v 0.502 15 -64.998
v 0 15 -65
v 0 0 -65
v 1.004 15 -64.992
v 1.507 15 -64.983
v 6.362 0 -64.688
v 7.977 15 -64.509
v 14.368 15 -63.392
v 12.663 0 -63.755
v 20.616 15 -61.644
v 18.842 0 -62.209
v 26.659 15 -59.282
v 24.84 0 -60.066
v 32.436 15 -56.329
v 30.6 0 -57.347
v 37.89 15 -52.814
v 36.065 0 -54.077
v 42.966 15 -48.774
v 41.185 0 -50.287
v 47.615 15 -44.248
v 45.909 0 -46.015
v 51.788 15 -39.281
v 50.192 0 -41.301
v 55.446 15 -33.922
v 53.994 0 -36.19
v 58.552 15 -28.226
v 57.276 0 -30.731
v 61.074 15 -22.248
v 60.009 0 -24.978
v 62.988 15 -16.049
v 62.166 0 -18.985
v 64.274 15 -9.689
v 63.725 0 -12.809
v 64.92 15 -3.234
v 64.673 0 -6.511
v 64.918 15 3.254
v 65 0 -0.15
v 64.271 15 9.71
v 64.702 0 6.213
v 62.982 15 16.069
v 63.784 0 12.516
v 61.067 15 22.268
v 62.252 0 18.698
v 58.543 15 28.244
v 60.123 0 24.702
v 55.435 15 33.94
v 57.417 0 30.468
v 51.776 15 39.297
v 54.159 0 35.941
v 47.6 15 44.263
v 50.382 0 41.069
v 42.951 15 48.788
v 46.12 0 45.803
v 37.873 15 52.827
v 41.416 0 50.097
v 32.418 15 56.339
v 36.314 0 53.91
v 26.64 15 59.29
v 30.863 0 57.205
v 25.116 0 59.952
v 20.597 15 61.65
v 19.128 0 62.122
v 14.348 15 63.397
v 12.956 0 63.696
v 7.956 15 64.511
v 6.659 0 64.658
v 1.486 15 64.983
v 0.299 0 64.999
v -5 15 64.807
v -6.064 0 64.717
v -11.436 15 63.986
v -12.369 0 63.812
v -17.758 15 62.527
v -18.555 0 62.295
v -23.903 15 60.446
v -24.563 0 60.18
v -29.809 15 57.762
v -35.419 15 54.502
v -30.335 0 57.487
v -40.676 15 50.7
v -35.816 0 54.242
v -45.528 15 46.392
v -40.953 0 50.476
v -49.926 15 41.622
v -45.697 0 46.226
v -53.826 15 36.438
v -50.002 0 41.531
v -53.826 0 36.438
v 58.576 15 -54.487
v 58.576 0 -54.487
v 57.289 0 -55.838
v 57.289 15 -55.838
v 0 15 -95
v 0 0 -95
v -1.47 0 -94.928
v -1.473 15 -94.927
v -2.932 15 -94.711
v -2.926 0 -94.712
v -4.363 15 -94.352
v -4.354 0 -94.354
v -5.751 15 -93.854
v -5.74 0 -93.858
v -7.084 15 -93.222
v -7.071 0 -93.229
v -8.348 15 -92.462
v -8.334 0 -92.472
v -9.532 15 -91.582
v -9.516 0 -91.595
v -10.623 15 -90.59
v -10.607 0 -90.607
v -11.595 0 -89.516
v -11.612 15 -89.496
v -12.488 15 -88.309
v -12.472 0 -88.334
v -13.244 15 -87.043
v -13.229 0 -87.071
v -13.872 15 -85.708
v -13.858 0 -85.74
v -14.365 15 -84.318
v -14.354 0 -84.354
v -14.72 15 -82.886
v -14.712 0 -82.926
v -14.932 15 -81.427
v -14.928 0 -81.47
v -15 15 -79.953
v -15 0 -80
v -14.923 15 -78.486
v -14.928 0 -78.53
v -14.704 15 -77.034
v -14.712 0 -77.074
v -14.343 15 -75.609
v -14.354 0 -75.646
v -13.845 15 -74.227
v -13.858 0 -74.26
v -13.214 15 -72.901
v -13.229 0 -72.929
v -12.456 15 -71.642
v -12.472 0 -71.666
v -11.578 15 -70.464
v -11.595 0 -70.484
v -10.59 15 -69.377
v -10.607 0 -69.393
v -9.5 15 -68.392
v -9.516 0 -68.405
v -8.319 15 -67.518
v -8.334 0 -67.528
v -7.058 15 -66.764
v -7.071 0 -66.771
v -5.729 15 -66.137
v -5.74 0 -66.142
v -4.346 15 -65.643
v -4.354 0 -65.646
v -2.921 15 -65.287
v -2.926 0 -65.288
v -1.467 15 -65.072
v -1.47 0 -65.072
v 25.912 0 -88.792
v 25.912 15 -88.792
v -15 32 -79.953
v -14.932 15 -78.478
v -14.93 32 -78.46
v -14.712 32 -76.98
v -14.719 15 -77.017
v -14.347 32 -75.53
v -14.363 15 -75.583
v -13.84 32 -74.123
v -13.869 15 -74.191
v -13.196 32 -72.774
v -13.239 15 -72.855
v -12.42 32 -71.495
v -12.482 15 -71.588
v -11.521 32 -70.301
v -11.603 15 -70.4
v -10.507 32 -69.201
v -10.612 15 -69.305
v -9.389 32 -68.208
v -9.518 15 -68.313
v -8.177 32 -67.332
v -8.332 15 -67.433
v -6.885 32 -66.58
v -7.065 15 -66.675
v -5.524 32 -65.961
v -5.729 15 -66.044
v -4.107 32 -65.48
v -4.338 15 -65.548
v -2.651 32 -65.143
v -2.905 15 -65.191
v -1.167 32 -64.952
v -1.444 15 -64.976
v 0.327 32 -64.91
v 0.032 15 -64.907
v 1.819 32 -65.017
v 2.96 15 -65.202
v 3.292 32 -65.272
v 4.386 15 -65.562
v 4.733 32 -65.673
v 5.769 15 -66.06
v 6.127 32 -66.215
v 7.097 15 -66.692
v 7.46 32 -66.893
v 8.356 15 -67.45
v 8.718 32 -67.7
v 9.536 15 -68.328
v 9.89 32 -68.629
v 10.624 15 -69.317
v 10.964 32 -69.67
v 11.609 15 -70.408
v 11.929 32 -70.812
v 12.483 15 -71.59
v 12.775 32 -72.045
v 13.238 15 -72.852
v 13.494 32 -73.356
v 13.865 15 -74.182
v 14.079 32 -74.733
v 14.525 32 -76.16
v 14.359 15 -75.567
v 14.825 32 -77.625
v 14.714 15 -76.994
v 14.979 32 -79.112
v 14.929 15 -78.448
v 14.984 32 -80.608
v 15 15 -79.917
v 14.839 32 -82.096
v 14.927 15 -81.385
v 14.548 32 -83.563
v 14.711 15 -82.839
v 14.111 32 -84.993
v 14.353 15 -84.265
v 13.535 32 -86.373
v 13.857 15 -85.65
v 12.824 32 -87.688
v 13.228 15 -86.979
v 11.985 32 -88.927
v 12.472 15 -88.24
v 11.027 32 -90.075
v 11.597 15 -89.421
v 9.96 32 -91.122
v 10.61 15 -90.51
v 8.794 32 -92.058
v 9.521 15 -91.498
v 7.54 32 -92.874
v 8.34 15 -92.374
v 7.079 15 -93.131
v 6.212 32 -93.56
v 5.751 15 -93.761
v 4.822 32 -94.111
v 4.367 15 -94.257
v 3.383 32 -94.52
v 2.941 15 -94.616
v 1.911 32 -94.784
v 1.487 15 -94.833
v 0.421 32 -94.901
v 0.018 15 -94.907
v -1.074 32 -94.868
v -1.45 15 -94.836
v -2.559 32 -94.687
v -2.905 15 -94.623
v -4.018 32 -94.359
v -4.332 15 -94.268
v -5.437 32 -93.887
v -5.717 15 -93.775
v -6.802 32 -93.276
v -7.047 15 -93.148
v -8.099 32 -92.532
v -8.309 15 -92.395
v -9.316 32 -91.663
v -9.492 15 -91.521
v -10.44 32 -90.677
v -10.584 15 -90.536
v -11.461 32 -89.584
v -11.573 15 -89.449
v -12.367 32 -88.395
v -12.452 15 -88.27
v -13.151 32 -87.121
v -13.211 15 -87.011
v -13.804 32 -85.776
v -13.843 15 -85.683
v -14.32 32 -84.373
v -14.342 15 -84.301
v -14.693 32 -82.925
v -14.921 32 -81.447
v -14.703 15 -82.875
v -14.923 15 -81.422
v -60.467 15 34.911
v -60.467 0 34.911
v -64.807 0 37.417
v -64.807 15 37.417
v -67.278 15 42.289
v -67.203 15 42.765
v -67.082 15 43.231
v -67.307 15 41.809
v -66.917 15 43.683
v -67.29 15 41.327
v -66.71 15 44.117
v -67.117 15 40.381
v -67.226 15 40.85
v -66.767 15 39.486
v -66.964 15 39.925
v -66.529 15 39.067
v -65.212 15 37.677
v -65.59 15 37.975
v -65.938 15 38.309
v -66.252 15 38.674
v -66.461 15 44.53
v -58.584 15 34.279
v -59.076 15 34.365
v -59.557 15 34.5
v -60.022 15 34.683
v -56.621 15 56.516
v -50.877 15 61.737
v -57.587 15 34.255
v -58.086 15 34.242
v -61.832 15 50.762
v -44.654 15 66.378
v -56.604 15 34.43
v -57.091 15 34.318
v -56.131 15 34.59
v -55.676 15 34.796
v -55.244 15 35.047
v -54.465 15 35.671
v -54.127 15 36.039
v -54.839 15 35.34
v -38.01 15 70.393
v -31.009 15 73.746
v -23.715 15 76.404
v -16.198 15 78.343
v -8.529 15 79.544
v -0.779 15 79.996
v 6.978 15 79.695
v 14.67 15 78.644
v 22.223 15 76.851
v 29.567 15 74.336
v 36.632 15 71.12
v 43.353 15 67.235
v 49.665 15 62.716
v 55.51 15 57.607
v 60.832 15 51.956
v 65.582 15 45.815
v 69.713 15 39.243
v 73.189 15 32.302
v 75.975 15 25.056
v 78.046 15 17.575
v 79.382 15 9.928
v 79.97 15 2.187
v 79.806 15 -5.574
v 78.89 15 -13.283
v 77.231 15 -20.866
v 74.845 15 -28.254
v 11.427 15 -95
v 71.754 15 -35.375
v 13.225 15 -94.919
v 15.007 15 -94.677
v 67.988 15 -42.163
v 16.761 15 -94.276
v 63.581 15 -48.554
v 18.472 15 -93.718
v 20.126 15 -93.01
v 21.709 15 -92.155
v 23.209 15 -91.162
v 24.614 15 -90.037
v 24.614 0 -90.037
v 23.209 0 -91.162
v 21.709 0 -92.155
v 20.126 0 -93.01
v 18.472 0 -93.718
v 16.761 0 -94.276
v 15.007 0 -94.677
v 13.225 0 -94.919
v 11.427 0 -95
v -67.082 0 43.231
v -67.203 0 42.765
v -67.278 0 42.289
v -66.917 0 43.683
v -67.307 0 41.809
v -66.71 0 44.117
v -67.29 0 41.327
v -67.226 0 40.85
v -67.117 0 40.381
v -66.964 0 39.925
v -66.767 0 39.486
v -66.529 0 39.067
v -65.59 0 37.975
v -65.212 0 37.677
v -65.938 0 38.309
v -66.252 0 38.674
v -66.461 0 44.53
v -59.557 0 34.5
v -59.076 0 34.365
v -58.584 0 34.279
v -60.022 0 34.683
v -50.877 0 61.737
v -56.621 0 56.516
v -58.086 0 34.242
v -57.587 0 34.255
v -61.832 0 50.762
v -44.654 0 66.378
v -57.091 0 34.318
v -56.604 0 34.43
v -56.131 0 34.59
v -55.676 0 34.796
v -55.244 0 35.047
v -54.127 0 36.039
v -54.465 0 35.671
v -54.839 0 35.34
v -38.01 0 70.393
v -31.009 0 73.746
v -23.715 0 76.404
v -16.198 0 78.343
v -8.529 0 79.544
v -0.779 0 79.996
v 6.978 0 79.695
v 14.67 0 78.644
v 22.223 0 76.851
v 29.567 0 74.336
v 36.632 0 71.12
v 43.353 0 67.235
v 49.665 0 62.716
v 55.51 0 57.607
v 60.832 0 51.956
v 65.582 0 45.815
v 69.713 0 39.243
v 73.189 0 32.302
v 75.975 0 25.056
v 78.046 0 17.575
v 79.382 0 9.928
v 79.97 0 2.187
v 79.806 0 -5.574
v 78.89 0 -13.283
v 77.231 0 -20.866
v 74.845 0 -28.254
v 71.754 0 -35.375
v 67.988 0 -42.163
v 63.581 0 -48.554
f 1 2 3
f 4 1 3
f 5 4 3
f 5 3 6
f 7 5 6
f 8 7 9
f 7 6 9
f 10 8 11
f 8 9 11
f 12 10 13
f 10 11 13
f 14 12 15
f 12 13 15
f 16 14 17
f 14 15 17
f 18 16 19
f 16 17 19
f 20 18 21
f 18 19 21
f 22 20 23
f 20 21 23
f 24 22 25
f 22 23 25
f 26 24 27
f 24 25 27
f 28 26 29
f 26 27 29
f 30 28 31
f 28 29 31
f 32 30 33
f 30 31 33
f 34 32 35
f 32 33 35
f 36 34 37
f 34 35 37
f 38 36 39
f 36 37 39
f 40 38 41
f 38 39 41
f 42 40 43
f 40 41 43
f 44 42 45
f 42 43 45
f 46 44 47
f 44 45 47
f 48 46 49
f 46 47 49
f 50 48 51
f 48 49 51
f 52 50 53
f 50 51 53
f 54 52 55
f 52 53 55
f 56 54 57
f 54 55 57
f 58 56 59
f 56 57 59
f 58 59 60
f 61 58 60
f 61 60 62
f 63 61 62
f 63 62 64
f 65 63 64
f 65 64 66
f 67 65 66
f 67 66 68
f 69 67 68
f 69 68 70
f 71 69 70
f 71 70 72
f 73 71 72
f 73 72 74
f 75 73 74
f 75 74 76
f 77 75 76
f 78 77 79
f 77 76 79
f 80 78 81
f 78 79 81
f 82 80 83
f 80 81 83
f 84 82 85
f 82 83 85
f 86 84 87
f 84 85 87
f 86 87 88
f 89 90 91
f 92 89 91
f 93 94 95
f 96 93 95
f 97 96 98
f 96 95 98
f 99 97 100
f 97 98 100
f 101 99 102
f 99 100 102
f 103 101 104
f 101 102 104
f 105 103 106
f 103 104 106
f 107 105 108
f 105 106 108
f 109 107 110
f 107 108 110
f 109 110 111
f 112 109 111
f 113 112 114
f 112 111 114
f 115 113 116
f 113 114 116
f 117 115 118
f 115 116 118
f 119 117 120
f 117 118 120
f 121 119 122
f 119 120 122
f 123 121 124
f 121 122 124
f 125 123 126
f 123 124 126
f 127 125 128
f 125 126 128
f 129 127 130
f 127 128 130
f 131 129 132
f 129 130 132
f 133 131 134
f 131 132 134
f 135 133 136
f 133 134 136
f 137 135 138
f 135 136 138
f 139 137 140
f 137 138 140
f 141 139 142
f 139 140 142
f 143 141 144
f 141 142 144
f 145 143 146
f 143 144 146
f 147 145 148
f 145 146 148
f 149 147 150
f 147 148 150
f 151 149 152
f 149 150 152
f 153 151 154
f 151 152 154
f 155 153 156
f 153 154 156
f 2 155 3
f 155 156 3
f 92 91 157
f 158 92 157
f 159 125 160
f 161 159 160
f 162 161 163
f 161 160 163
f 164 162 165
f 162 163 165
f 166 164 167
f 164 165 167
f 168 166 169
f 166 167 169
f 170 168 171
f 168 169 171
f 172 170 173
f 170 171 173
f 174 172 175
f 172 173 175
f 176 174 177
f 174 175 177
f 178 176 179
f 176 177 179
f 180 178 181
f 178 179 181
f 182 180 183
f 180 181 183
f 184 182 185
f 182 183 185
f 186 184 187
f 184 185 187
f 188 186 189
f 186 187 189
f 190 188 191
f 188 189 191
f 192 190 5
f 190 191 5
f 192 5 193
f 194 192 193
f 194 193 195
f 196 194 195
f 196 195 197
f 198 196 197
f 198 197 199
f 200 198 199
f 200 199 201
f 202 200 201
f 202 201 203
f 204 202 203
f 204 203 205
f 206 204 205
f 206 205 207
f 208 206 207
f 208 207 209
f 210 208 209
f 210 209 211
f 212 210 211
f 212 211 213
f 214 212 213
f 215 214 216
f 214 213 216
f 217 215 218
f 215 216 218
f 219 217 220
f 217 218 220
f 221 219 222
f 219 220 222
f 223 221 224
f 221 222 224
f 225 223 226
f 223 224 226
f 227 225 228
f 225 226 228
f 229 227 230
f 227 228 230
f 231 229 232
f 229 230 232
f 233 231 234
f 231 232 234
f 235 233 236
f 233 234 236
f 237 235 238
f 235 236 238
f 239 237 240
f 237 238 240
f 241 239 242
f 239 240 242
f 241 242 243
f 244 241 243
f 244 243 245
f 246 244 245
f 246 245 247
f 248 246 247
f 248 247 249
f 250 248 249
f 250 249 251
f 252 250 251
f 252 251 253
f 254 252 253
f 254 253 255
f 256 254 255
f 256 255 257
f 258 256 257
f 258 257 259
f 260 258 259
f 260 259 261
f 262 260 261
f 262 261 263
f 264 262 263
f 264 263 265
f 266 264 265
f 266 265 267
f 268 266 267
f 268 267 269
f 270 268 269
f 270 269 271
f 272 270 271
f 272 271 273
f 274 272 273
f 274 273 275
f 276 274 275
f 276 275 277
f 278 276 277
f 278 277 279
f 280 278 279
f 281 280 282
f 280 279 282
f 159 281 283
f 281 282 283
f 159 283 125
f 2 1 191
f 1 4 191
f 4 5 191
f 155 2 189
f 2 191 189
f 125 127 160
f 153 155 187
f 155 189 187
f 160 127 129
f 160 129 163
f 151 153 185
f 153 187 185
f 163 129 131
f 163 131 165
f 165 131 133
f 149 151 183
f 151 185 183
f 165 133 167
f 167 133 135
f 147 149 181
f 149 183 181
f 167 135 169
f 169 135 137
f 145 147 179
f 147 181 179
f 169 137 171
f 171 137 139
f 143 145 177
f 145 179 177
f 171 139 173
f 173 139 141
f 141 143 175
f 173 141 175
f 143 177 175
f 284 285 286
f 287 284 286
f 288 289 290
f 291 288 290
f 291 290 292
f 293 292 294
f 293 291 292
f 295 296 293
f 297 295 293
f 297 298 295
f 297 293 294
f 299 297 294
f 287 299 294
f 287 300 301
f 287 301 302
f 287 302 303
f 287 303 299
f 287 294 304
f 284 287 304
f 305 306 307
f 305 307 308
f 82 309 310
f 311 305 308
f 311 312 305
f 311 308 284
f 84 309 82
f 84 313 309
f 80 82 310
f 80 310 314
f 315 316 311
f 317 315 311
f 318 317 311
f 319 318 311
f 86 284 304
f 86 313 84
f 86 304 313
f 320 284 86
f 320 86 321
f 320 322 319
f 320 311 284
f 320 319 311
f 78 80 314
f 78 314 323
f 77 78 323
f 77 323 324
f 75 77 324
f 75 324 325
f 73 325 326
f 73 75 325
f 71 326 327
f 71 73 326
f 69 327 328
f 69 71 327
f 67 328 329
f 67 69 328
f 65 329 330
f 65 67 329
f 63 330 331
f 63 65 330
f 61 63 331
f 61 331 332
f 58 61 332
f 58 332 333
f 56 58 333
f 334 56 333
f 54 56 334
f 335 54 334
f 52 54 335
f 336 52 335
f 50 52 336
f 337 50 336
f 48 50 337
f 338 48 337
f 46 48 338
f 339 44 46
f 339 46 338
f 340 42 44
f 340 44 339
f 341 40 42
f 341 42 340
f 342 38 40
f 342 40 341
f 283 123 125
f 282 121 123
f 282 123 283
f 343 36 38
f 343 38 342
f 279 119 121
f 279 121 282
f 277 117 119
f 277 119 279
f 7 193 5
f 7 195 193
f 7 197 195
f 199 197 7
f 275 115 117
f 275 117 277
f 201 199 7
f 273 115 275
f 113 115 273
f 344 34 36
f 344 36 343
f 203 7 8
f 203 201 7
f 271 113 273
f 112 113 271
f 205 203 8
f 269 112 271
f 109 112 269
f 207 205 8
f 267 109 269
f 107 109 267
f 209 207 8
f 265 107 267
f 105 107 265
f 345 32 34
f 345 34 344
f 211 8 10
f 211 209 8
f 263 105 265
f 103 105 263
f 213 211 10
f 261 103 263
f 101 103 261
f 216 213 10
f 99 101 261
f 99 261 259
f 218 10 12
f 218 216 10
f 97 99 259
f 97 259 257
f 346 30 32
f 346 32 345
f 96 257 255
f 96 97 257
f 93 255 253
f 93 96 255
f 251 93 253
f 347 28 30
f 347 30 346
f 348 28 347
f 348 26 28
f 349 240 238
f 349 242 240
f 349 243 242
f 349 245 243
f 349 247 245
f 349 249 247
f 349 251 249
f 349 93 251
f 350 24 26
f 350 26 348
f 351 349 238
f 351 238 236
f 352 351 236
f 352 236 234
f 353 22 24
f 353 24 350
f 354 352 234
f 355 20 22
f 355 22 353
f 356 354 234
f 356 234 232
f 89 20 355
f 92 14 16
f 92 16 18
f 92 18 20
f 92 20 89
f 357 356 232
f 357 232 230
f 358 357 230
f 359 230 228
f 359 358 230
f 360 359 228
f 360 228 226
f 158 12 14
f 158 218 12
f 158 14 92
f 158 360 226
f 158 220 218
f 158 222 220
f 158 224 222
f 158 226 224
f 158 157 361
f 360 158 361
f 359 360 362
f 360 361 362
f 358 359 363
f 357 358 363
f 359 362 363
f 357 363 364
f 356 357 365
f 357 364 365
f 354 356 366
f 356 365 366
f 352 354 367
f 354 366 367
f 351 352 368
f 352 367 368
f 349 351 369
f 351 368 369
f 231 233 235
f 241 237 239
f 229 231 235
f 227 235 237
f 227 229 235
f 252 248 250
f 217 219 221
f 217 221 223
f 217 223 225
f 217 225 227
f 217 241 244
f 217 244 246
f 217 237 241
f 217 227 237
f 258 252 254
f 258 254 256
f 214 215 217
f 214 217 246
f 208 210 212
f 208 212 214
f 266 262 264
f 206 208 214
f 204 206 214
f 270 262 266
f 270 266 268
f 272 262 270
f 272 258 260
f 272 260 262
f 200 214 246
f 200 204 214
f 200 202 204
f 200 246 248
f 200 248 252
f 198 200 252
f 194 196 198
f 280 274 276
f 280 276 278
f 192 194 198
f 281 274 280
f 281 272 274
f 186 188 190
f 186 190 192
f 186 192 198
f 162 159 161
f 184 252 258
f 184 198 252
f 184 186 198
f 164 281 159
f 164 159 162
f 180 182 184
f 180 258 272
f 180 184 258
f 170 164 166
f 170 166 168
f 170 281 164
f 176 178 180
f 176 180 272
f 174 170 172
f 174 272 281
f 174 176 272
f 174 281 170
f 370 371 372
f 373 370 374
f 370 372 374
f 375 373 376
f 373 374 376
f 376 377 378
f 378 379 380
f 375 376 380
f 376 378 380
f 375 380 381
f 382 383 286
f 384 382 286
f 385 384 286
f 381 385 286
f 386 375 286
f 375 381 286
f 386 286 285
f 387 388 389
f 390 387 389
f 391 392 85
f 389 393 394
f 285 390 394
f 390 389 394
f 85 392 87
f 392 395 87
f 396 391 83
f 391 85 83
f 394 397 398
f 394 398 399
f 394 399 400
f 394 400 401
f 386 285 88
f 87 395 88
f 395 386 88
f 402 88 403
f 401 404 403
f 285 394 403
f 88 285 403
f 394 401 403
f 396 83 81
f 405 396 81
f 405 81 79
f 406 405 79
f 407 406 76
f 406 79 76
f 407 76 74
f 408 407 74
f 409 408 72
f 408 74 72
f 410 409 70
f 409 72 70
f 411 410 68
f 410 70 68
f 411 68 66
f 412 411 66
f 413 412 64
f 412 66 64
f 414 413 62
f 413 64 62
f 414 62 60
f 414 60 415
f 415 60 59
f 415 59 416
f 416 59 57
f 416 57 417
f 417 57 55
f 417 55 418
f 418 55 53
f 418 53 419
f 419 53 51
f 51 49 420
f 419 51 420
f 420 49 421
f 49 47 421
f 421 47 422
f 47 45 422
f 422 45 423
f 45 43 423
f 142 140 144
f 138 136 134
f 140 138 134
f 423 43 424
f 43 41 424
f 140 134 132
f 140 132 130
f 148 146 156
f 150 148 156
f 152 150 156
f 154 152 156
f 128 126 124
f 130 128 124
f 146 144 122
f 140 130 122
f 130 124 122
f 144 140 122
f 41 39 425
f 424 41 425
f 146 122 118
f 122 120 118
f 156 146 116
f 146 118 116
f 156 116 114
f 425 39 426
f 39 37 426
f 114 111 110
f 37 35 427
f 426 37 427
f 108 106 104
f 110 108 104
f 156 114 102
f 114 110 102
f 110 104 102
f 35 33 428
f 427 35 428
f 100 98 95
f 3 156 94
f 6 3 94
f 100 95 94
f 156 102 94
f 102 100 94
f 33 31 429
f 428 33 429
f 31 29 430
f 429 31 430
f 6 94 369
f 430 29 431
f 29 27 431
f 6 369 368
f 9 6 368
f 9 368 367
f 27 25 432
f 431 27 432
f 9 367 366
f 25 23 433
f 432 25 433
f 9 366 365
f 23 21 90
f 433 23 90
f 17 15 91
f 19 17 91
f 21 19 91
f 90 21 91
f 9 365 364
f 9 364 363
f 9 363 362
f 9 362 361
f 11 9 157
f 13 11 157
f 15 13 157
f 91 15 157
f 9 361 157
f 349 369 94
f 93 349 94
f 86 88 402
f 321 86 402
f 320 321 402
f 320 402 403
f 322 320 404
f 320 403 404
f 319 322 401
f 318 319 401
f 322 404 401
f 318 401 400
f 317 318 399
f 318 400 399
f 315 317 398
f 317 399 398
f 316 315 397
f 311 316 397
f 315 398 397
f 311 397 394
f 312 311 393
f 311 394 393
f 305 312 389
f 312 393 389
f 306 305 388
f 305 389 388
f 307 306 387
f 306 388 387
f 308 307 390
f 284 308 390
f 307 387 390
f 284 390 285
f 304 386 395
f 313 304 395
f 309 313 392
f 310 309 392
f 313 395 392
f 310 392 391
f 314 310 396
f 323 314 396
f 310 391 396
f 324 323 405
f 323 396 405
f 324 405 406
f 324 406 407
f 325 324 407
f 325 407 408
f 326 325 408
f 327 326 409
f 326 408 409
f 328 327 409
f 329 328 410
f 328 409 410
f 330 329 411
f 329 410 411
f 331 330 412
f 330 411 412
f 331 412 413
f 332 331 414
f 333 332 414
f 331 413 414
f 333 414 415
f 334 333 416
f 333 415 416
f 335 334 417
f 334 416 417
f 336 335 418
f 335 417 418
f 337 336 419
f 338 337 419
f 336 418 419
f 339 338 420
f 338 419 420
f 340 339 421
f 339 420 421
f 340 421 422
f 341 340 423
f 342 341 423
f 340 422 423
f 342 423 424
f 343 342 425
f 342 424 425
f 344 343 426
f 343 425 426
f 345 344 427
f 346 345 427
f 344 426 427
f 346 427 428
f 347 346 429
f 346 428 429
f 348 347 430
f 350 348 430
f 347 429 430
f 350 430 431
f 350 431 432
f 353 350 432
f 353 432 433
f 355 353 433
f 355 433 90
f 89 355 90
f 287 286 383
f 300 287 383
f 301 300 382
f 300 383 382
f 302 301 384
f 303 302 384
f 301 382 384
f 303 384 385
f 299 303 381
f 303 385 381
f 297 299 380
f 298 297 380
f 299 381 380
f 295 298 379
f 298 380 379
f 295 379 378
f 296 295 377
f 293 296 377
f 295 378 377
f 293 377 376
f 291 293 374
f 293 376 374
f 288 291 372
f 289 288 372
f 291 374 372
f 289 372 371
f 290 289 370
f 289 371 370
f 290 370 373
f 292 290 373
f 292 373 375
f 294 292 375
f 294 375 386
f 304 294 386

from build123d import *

# Parameters (mm, degrees)
EXTRUDE_4_DEPTH = 15
SKETCH_10_R     = 15
EXTRUDE_5_DEPTH = 17


with BuildPart() as part:
    # ｽｹｯﾁ2 → ﾎﾞｽ - 押し出し4 (new body)
    with BuildSketch(Plane(origin=(0, 0, 0), x_dir=(1, 0, 0), z_dir=(0, 1, 0))):
        with BuildLine():
            ThreePointArc((-53.82643789, -36.437818048), (-56.846261527, -34.367935813), (-60.466933112, -34.910600109))
            Line((-60.466933112, -34.910600109), (-64.807406984, -37.416573868))
            ThreePointArc((-64.807406984, -37.416573868), (-67.177509772, -40.614402853), (-66.461234116, -44.529814279))
            ThreePointArc((-66.461234116, -44.529814279), (49.665387485, -62.716419588), (58.57572973, 54.487465409))
            Line((58.57572973, 54.487465409), (57.289371136, 55.838409315))
            Line((57.289371136, 55.838409315), (25.911523347, 88.791671712))
            ThreePointArc((25.911523347, 88.791671712), (19.306695871, 93.382511176), (11.427401304, 95))
            Line((11.427401304, 95), (0, 95))
            ThreePointArc((0, 95), (-15, 80), (0, 65))
            ThreePointArc((0, 65), (57.41714976, -30.467538684), (-53.82643789, -36.437818048))
        make_face()
    extrude(amount=EXTRUDE_4_DEPTH)

    # ｽｹｯﾁ10 → ﾎﾞｽ - 押し出し5 (add)
    with BuildSketch(Plane(origin=(0, 15, 0), x_dir=(1, 0, 0), z_dir=(0, 1, 0))):
        with Locations(Location((0, 79.906692584, 0), (0, 0, 179.821795675))):
            Circle(SKETCH_10_R)
    extrude(amount=EXTRUDE_5_DEPTH)


solid = part.part
